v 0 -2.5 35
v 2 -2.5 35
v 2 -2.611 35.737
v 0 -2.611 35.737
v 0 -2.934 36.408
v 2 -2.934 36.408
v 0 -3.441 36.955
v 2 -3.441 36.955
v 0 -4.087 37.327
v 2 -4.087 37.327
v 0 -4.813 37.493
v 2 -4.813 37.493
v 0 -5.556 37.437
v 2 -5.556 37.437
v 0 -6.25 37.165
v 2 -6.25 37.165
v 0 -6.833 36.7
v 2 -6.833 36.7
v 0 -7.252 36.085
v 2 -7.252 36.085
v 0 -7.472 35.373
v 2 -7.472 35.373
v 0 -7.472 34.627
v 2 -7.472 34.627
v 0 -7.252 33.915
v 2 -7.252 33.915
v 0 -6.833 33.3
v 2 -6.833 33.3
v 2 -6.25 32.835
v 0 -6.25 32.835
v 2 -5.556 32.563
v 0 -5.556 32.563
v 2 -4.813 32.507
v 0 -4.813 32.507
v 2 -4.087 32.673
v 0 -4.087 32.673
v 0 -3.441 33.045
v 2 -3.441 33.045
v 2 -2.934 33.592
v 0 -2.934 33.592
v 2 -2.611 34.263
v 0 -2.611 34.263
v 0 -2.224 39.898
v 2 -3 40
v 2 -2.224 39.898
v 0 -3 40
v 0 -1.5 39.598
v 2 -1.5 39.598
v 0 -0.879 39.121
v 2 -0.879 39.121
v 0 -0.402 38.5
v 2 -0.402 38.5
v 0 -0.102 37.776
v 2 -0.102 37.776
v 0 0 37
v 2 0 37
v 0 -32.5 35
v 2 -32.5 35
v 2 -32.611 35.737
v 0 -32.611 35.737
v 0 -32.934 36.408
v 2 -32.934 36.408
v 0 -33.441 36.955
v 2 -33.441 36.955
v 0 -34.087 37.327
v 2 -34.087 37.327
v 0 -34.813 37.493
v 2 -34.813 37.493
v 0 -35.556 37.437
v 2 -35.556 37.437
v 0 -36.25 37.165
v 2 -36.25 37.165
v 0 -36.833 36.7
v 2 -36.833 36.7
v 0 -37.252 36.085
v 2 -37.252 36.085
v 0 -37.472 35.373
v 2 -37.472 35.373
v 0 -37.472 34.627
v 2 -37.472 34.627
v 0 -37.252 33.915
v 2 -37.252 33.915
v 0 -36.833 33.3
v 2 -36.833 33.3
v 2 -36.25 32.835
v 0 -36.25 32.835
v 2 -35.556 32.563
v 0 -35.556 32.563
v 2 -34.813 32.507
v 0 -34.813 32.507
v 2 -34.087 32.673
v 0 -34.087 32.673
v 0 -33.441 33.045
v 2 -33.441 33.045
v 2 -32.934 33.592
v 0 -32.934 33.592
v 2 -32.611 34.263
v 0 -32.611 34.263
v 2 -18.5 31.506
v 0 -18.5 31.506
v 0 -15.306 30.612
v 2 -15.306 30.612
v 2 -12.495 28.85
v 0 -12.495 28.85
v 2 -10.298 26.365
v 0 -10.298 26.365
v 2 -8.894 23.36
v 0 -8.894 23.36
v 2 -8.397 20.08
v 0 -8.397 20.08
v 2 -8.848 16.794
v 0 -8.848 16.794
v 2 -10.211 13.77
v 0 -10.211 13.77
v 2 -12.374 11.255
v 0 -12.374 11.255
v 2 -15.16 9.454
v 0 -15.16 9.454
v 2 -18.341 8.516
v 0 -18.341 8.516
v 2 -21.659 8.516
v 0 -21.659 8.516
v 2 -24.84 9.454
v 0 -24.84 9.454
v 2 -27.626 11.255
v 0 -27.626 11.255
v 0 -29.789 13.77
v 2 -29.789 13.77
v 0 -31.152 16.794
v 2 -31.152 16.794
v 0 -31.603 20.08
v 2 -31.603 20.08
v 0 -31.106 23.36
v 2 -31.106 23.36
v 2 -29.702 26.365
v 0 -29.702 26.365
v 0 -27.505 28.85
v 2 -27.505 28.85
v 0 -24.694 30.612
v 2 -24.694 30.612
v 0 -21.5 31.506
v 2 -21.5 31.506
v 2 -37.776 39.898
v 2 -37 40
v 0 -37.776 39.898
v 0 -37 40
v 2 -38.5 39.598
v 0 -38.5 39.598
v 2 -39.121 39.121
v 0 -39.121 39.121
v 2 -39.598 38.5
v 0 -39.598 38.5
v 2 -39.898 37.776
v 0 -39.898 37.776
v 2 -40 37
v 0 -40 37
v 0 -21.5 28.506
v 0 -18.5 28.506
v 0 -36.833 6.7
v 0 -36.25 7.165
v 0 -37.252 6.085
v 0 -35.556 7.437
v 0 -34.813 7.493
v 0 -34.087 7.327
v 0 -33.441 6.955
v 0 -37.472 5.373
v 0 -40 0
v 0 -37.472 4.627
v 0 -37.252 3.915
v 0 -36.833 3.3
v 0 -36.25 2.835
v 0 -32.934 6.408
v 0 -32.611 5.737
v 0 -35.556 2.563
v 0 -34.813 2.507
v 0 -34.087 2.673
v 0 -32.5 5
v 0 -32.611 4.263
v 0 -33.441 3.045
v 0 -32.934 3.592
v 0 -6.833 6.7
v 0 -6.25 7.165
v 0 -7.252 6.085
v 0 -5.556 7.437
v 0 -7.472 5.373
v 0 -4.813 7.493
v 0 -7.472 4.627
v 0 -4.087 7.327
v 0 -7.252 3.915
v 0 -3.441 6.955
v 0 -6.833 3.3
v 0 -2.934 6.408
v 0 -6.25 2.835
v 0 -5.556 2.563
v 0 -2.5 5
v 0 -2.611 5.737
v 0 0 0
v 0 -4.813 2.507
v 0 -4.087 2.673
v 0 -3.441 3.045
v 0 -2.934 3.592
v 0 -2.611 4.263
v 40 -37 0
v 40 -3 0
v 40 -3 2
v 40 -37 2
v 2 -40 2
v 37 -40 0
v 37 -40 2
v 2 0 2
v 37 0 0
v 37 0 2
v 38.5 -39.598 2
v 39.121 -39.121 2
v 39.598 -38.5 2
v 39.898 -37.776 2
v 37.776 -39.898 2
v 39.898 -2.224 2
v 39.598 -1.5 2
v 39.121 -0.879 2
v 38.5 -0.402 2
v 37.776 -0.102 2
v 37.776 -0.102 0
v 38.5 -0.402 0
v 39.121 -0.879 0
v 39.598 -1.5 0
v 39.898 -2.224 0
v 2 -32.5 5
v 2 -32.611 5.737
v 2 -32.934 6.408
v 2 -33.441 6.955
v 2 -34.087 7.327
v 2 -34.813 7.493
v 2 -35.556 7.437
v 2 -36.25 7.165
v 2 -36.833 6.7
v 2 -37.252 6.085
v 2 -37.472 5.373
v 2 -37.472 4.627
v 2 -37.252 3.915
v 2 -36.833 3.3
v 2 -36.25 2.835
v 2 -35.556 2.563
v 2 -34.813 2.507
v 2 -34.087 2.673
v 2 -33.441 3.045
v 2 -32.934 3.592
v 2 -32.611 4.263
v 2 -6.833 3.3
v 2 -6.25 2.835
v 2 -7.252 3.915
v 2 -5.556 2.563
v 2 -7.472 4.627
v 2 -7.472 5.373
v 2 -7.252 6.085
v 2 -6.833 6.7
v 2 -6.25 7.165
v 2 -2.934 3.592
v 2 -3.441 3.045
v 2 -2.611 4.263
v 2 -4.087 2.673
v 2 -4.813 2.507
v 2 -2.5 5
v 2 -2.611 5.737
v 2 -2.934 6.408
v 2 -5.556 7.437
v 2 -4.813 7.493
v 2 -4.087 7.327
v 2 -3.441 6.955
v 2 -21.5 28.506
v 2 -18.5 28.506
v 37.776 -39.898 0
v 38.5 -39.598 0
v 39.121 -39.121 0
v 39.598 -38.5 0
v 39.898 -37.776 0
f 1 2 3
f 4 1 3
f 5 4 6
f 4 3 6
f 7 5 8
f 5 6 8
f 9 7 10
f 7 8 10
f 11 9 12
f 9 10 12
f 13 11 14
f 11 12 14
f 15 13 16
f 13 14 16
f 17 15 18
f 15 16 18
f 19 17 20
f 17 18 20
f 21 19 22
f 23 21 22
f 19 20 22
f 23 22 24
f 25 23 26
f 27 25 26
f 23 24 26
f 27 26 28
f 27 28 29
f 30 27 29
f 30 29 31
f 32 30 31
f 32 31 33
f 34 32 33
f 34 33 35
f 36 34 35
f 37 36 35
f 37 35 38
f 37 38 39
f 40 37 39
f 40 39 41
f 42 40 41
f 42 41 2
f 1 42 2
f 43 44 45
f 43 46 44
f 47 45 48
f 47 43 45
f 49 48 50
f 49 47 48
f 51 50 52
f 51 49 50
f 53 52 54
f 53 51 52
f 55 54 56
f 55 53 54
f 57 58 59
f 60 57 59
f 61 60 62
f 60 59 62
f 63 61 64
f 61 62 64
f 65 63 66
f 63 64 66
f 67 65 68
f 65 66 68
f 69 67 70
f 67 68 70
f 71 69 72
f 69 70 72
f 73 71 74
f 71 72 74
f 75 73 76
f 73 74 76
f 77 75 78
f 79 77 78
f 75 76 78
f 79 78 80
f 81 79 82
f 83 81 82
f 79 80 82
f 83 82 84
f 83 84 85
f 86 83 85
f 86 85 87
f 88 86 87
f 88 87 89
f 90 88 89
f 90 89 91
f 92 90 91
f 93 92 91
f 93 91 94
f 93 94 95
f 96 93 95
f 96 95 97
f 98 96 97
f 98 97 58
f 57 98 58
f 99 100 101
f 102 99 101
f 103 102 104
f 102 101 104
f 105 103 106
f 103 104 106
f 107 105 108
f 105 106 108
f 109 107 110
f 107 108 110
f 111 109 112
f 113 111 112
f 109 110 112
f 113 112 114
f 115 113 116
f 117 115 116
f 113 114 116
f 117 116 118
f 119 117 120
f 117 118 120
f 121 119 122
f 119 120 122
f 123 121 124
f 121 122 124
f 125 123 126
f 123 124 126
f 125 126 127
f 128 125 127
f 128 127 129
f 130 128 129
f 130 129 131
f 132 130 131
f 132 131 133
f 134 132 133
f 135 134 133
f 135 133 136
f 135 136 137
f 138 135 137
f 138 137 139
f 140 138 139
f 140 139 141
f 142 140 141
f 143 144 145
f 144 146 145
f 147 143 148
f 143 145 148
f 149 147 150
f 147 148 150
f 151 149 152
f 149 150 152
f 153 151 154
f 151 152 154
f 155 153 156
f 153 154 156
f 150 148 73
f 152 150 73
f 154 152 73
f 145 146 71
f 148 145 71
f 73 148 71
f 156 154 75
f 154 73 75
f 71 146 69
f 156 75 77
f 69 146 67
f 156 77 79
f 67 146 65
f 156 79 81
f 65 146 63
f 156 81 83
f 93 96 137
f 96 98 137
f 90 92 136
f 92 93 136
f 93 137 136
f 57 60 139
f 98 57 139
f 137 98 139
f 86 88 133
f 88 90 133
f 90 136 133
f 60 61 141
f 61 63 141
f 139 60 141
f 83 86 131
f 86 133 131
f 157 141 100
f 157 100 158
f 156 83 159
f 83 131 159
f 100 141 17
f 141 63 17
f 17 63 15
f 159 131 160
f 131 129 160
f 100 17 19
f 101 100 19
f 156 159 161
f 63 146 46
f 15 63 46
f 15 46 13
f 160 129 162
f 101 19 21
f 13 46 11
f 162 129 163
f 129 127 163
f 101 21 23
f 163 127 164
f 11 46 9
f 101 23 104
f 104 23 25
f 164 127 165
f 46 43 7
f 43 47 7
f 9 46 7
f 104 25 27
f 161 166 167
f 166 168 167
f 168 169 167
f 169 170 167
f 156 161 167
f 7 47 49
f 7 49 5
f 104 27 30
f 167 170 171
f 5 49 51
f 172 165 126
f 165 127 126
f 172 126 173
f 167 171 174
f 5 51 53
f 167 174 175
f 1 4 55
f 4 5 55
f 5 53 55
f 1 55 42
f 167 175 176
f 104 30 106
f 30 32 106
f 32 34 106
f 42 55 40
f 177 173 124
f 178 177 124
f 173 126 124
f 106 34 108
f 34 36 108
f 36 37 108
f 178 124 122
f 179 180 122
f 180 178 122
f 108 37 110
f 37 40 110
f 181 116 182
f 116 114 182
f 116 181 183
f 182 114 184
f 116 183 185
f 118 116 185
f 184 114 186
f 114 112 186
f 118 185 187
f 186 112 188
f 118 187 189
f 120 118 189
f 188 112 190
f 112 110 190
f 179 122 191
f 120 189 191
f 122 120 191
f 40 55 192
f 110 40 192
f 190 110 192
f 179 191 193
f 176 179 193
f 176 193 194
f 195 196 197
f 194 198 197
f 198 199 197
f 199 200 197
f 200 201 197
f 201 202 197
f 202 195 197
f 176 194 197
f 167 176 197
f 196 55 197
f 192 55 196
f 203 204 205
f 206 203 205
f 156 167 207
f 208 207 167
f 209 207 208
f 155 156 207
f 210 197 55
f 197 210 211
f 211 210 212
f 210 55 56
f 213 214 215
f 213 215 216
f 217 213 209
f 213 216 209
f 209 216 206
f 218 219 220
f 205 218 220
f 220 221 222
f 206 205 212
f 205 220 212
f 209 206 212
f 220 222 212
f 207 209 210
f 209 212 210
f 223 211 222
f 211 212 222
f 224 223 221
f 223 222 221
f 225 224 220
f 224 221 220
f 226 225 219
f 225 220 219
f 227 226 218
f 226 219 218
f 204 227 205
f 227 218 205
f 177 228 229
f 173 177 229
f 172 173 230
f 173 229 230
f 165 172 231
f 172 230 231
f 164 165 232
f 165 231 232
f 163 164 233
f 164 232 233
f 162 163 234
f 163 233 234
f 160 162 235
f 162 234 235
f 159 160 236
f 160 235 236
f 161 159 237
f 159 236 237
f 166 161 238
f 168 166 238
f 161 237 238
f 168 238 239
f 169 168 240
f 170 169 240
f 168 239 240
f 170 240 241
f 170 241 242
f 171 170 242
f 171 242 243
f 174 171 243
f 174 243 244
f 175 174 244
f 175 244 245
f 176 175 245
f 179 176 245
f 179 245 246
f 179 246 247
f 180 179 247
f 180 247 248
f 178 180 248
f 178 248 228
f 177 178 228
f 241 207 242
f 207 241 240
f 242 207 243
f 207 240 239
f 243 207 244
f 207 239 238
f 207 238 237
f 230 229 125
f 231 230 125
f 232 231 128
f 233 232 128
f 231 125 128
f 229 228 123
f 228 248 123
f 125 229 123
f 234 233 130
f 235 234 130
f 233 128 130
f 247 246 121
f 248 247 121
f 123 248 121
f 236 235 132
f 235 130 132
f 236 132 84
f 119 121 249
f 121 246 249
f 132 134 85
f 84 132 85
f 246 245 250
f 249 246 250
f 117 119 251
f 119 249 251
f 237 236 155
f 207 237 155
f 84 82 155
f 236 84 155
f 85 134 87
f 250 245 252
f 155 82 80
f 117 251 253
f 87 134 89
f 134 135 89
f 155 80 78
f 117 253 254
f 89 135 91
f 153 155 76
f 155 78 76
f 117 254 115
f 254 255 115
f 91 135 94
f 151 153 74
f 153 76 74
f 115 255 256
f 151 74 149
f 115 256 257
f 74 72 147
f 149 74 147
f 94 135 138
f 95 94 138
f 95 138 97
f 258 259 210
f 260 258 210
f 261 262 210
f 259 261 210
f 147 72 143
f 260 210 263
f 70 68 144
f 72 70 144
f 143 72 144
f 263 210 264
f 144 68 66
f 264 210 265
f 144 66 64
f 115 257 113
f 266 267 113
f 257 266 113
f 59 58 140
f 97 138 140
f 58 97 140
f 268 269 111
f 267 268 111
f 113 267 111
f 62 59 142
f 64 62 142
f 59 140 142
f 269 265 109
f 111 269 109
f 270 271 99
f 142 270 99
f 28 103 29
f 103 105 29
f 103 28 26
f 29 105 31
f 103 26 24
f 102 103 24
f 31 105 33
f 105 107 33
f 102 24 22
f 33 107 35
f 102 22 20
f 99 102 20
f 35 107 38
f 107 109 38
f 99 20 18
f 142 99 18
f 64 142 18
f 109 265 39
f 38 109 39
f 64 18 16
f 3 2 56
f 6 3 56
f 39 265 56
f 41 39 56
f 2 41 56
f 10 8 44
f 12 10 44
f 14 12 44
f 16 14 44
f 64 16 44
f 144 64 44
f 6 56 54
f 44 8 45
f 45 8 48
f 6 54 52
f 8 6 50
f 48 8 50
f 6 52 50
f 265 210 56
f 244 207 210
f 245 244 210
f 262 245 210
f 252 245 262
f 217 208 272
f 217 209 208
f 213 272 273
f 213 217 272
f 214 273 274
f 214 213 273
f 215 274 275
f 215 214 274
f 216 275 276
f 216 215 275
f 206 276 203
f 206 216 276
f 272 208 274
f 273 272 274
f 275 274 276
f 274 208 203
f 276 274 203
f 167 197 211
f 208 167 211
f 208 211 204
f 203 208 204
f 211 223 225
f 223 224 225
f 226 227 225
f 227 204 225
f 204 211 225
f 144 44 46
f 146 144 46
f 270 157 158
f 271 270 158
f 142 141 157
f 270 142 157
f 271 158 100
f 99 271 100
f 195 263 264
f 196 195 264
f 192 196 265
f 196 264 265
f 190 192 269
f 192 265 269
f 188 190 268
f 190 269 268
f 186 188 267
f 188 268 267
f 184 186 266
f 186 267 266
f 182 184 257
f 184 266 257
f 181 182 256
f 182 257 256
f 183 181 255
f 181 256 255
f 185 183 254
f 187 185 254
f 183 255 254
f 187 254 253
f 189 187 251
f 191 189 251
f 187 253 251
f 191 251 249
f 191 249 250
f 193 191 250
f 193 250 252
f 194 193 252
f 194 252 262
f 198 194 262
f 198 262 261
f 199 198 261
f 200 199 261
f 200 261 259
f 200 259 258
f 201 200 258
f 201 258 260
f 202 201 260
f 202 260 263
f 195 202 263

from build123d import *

# Parameters (mm, degrees)
F1_DEPTH = 40
F3_D     = 5
F5_DEPTH = 20
F6_R     = 3


with BuildPart() as f1:
    # F0 (on Front) → F1 (new body)
    with BuildSketch(Plane.XZ):
        Polygon((0, 40), (0, 0), (40, 0), (40, 2), (2, 2), (2, 40), align=None)
    extrude(amount=F1_DEPTH)

    # F3 (through all)
    with Locations(Plane(origin=(0, 0, 0), x_dir=(0, -1, 0), z_dir=(-1, 0, 0))):
        with Locations((5, 5), (5, 35), (35, 5), (35, 35)):
            Hole(F3_D / 2)

    # F4 (on face) → F5 (cut)
    with BuildSketch(Plane(origin=(0, 0, 0), x_dir=(0, -1, 0), z_dir=(-1, 0, 0))):
        with BuildLine():
            Line((18.5, 28.506096), (18.5, 31.506096))
            ThreePointArc((18.5, 31.506096), (20, 8.396542), (21.5, 31.506096))
            Line((21.5, 31.506096), (21.5, 28.506096))
            Line((21.5, 28.506096), (20, 28.506096))
            Line((20, 28.506096), (18.5, 28.506096))
        make_face()
    extrude(amount=-F5_DEPTH, mode=Mode.SUBTRACT)

    # F6
    f6_edges = [f1.edges().sort_by_distance(p)[0] for p in [
        (1, -40, 40),
        (1, 0, 40),
        (40, -40, 1),
        (40, 0, 1),
    ]]
    fillet(f6_edges, radius=F6_R)


solid = f1.part
